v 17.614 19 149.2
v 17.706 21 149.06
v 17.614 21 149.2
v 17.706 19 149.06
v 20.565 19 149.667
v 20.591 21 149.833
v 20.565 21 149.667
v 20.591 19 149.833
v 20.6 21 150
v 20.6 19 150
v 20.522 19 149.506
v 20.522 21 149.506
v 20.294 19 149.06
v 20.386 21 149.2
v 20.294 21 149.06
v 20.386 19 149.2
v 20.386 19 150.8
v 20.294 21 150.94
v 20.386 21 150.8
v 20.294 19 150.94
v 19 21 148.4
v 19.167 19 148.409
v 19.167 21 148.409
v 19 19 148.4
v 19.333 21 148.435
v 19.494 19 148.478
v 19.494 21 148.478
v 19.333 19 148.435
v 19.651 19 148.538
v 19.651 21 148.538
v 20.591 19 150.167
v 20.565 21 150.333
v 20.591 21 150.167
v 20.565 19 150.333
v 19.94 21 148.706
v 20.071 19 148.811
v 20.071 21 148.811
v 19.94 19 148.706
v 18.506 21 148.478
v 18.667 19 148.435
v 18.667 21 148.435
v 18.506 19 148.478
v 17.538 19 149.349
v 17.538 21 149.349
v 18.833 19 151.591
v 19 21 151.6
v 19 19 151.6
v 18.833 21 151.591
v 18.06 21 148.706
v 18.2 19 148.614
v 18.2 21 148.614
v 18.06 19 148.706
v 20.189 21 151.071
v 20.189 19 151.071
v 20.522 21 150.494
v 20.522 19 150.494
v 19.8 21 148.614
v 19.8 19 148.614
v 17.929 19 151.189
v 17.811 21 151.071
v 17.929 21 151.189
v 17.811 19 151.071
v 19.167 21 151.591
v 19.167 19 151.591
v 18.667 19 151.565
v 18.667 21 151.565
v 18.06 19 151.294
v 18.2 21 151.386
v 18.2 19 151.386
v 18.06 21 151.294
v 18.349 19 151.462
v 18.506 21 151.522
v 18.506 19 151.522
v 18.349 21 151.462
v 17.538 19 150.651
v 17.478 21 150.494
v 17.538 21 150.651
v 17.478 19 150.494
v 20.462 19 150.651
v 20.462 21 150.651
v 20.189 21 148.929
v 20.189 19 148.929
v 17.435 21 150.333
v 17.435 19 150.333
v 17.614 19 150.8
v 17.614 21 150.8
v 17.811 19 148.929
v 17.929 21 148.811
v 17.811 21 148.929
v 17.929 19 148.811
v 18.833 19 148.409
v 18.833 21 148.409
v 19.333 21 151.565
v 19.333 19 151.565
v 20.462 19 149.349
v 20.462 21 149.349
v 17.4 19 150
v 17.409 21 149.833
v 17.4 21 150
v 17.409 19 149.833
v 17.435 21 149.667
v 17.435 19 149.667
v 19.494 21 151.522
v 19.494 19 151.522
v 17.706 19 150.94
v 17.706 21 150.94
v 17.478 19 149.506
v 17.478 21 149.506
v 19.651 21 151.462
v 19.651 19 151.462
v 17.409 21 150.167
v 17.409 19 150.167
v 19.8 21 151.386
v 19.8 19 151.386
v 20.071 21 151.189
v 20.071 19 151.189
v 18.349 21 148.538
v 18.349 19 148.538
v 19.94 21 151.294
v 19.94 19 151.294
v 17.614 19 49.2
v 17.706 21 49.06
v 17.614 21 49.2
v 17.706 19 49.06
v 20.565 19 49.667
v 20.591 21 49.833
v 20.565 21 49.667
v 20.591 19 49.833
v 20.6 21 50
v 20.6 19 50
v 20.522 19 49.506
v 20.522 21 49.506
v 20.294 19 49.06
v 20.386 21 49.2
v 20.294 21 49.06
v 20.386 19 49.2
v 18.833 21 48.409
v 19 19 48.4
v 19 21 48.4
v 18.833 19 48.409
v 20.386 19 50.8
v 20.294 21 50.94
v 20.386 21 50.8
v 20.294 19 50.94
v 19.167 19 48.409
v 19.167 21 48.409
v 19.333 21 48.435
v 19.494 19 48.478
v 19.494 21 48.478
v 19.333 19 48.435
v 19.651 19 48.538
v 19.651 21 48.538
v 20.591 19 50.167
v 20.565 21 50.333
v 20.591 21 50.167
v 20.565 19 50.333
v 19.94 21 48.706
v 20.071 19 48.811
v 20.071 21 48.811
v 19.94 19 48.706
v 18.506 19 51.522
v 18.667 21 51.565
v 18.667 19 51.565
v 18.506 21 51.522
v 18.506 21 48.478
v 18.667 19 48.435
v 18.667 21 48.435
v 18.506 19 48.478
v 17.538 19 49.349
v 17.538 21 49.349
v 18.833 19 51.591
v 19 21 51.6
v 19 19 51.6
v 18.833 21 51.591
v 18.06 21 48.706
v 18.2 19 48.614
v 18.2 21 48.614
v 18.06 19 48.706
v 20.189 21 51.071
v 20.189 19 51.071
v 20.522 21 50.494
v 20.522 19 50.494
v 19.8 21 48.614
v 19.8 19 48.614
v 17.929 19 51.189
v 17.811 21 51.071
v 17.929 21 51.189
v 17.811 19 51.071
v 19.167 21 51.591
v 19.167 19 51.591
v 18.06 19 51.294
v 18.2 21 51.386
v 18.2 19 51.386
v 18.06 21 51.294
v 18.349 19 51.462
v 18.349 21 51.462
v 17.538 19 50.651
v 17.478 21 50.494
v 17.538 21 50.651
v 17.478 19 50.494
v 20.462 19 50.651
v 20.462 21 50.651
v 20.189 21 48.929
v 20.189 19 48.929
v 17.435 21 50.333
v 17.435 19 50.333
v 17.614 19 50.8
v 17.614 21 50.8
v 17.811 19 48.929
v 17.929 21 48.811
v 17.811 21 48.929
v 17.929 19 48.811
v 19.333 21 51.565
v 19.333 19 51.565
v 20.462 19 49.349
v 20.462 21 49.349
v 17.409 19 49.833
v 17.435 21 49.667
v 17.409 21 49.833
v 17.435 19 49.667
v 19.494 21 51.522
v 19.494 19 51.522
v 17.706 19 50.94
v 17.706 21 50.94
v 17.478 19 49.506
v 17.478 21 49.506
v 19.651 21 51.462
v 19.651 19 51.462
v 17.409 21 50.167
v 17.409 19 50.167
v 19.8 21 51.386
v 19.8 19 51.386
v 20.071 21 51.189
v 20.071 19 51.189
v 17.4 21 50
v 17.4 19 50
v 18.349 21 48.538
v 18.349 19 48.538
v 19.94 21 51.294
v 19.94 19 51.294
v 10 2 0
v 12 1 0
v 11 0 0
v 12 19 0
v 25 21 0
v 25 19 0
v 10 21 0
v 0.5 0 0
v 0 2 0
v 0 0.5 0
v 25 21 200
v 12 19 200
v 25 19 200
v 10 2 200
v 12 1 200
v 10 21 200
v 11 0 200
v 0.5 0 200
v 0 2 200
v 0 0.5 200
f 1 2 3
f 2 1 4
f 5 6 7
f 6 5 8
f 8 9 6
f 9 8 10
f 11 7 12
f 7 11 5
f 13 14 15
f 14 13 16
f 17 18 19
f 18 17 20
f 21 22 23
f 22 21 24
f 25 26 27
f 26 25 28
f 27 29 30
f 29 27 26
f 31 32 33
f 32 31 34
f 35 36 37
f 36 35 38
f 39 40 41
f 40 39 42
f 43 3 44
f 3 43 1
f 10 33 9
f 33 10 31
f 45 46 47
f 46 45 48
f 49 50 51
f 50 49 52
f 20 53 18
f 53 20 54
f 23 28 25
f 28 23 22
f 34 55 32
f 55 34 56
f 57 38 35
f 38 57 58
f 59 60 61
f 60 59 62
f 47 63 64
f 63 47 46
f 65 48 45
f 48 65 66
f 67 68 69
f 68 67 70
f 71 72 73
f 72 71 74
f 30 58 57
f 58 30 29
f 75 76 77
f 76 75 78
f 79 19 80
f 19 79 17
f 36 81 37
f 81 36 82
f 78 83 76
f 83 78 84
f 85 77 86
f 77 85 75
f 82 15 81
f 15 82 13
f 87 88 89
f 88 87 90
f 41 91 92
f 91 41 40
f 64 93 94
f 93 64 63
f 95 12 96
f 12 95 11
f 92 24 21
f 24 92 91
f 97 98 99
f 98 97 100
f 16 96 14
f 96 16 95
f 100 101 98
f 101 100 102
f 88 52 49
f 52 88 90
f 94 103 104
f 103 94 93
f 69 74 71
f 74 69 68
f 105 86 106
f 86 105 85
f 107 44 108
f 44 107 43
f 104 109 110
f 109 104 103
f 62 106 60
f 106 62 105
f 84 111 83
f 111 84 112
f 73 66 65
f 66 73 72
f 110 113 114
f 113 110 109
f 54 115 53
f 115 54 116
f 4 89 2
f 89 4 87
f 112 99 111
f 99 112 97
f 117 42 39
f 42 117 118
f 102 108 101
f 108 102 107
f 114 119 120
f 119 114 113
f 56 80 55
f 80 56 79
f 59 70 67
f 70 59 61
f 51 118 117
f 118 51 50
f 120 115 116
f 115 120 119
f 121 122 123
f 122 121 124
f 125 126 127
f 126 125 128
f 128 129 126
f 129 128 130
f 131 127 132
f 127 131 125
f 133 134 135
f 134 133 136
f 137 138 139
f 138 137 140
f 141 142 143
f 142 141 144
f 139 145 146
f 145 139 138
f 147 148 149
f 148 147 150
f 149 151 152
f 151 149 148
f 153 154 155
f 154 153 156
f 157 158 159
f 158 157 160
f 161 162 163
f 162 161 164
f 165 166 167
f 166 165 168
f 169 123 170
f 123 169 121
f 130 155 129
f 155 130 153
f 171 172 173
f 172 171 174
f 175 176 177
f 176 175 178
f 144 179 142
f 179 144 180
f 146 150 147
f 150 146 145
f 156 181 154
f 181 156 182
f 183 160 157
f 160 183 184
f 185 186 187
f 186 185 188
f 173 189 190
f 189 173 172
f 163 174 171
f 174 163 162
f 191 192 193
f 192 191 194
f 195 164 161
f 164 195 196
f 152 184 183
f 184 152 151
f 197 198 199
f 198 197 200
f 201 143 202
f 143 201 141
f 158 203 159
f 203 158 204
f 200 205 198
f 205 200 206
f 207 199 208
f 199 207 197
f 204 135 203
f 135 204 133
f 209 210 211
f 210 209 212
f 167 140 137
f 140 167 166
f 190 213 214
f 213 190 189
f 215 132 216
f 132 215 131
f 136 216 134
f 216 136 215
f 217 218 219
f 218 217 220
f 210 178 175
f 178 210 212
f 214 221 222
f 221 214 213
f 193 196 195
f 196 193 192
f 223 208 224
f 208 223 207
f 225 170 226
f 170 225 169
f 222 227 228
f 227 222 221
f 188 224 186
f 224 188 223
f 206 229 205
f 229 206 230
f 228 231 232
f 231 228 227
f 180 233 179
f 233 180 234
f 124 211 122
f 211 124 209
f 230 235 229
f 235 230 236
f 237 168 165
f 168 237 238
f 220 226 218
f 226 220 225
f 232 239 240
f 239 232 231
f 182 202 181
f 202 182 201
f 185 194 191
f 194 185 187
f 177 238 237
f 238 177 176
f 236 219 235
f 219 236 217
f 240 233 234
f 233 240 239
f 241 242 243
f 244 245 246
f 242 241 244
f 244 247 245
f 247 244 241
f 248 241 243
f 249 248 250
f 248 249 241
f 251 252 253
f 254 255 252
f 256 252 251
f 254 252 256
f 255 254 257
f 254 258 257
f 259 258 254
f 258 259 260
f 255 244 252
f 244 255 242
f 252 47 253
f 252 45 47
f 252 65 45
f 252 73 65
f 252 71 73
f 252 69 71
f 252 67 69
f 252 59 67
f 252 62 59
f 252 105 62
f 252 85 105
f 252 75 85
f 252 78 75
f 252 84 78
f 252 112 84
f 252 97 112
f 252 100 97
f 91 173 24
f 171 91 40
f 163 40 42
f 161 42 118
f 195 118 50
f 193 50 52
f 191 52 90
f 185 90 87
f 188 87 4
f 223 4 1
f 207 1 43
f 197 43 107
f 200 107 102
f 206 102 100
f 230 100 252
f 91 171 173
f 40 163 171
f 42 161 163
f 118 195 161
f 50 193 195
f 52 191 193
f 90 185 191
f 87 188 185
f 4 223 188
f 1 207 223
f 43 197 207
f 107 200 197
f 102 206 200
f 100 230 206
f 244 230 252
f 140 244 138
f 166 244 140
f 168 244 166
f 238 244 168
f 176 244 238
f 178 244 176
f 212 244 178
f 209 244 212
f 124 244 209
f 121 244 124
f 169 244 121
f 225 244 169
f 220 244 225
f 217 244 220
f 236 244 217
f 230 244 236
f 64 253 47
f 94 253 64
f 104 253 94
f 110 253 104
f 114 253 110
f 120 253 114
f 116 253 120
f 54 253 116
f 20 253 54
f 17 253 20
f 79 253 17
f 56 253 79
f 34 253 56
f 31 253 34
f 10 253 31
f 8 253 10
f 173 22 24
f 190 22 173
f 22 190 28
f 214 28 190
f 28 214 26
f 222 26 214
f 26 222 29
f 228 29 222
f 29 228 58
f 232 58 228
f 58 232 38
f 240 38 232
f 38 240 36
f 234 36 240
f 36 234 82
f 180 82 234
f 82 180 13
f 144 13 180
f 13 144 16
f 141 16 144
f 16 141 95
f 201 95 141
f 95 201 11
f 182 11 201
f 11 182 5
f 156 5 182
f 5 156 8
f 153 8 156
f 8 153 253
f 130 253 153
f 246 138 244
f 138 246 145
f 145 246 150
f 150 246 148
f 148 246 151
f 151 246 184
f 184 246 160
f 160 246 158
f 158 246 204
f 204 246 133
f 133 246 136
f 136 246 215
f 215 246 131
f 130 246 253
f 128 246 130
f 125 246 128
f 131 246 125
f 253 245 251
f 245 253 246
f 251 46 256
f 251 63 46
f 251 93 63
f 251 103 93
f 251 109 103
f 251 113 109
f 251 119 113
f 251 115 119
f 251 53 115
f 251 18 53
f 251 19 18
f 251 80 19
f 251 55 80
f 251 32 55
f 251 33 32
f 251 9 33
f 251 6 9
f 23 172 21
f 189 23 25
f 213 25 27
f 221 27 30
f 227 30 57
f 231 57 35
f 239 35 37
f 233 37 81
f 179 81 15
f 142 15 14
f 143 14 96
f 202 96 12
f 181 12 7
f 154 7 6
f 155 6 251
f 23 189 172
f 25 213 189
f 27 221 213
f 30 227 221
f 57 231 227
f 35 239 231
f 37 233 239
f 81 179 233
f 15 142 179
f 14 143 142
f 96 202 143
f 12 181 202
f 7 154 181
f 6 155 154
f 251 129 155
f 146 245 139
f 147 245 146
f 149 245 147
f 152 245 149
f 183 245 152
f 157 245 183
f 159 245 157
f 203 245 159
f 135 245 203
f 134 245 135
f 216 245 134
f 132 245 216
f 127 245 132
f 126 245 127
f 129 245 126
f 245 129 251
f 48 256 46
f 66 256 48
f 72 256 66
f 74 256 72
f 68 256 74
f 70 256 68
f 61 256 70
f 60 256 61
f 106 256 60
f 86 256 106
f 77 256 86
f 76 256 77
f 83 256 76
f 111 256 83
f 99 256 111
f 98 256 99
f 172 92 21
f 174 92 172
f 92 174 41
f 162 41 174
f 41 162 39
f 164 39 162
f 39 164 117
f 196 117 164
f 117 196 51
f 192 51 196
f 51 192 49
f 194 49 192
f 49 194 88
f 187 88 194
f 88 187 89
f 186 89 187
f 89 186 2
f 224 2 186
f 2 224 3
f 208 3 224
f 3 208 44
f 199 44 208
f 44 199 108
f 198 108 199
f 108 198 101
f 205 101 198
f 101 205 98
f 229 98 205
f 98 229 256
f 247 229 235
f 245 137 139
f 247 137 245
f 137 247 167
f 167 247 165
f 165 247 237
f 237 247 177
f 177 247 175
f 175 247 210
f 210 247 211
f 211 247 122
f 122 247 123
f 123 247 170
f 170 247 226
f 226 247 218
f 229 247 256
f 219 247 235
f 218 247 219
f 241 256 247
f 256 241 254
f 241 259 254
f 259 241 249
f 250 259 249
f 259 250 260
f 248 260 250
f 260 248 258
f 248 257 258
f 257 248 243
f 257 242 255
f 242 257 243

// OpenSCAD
// ============================================
// 基本寸法パラメータ (単位: mm)
// ============================================
left_w       = 10;   // 左側ブロックの幅
left_h       = 2;    // 左側ブロックの厚み (高さ)

pillar_w     = 2;    // 中央ピラーの幅
pillar_top_h = 19;   // 左側上面からピラー頂面までの高さ
total_h      = left_h + pillar_top_h; // 全高 (2 + 11 = 13mm)

right_w      = 13;    // 右側ブロックの幅
right_h      = 2;    // 右側ブロックの厚み (適宜調整)

extrude_len  = 200;  // 押し出し長さ: 10cm = 100mm

// ============================================
// 面取り・穴パラメータ (単位: mm)
// ============================================
chamfer_left  = 0.5; // 左下角の面取り幅 (C面)
chamfer_right = 1.0; // 右下(ピラー底面右)角の面取り幅 (C面)

screw_d       = 3.2; // 穴の直径 (通し穴マージン込み)
screw_pos_x   = 7;   // 右側ブロック左端(ピラー右面)からの距離 (幅方向)

// 2箇所の穴の位置 (押し出しZ軸方向: 端からのオフセット)
screw_pos_z1  = 150;  // 1つ目の穴のZ座標
screw_pos_z2  = 50;  // 2つ目の穴のZ座標

$fn = 60; // 円筒の滑らかさ

// ============================================
// 3Dモデル生成
// ============================================
difference() {
    // 押し出し本体 (底面側の角を面取りしたポリゴン)
    linear_extrude(height = extrude_len) {
        polygon(points = [
            // 左下角の面取り
            [chamfer_left, 0],
            
            // ピラー右下角の面取り
            [left_w + pillar_w - chamfer_right, 0],
            [left_w + pillar_w, chamfer_right],
            
            // 右側ブロックおよび上部形状
            [left_w + pillar_w, total_h - right_h],
            [left_w + pillar_w + right_w, total_h - right_h],
            [left_w + pillar_w + right_w, total_h],
            [left_w, total_h],
            [left_w, left_h],
            [0, left_h],
            
            // 左下角の面取りの戻り
            [0, chamfer_left]
        ]);
    }

    // 木ネジ用貫通穴 (2箇所)
    for (z = [screw_pos_z1, screw_pos_z2]) {
        translate([
            left_w + pillar_w + screw_pos_x,
            total_h - right_h - 1,
            z
        ])
        rotate([-90, 0, 0])
        cylinder(d = screw_d, h = right_h + 2);
    }
}
